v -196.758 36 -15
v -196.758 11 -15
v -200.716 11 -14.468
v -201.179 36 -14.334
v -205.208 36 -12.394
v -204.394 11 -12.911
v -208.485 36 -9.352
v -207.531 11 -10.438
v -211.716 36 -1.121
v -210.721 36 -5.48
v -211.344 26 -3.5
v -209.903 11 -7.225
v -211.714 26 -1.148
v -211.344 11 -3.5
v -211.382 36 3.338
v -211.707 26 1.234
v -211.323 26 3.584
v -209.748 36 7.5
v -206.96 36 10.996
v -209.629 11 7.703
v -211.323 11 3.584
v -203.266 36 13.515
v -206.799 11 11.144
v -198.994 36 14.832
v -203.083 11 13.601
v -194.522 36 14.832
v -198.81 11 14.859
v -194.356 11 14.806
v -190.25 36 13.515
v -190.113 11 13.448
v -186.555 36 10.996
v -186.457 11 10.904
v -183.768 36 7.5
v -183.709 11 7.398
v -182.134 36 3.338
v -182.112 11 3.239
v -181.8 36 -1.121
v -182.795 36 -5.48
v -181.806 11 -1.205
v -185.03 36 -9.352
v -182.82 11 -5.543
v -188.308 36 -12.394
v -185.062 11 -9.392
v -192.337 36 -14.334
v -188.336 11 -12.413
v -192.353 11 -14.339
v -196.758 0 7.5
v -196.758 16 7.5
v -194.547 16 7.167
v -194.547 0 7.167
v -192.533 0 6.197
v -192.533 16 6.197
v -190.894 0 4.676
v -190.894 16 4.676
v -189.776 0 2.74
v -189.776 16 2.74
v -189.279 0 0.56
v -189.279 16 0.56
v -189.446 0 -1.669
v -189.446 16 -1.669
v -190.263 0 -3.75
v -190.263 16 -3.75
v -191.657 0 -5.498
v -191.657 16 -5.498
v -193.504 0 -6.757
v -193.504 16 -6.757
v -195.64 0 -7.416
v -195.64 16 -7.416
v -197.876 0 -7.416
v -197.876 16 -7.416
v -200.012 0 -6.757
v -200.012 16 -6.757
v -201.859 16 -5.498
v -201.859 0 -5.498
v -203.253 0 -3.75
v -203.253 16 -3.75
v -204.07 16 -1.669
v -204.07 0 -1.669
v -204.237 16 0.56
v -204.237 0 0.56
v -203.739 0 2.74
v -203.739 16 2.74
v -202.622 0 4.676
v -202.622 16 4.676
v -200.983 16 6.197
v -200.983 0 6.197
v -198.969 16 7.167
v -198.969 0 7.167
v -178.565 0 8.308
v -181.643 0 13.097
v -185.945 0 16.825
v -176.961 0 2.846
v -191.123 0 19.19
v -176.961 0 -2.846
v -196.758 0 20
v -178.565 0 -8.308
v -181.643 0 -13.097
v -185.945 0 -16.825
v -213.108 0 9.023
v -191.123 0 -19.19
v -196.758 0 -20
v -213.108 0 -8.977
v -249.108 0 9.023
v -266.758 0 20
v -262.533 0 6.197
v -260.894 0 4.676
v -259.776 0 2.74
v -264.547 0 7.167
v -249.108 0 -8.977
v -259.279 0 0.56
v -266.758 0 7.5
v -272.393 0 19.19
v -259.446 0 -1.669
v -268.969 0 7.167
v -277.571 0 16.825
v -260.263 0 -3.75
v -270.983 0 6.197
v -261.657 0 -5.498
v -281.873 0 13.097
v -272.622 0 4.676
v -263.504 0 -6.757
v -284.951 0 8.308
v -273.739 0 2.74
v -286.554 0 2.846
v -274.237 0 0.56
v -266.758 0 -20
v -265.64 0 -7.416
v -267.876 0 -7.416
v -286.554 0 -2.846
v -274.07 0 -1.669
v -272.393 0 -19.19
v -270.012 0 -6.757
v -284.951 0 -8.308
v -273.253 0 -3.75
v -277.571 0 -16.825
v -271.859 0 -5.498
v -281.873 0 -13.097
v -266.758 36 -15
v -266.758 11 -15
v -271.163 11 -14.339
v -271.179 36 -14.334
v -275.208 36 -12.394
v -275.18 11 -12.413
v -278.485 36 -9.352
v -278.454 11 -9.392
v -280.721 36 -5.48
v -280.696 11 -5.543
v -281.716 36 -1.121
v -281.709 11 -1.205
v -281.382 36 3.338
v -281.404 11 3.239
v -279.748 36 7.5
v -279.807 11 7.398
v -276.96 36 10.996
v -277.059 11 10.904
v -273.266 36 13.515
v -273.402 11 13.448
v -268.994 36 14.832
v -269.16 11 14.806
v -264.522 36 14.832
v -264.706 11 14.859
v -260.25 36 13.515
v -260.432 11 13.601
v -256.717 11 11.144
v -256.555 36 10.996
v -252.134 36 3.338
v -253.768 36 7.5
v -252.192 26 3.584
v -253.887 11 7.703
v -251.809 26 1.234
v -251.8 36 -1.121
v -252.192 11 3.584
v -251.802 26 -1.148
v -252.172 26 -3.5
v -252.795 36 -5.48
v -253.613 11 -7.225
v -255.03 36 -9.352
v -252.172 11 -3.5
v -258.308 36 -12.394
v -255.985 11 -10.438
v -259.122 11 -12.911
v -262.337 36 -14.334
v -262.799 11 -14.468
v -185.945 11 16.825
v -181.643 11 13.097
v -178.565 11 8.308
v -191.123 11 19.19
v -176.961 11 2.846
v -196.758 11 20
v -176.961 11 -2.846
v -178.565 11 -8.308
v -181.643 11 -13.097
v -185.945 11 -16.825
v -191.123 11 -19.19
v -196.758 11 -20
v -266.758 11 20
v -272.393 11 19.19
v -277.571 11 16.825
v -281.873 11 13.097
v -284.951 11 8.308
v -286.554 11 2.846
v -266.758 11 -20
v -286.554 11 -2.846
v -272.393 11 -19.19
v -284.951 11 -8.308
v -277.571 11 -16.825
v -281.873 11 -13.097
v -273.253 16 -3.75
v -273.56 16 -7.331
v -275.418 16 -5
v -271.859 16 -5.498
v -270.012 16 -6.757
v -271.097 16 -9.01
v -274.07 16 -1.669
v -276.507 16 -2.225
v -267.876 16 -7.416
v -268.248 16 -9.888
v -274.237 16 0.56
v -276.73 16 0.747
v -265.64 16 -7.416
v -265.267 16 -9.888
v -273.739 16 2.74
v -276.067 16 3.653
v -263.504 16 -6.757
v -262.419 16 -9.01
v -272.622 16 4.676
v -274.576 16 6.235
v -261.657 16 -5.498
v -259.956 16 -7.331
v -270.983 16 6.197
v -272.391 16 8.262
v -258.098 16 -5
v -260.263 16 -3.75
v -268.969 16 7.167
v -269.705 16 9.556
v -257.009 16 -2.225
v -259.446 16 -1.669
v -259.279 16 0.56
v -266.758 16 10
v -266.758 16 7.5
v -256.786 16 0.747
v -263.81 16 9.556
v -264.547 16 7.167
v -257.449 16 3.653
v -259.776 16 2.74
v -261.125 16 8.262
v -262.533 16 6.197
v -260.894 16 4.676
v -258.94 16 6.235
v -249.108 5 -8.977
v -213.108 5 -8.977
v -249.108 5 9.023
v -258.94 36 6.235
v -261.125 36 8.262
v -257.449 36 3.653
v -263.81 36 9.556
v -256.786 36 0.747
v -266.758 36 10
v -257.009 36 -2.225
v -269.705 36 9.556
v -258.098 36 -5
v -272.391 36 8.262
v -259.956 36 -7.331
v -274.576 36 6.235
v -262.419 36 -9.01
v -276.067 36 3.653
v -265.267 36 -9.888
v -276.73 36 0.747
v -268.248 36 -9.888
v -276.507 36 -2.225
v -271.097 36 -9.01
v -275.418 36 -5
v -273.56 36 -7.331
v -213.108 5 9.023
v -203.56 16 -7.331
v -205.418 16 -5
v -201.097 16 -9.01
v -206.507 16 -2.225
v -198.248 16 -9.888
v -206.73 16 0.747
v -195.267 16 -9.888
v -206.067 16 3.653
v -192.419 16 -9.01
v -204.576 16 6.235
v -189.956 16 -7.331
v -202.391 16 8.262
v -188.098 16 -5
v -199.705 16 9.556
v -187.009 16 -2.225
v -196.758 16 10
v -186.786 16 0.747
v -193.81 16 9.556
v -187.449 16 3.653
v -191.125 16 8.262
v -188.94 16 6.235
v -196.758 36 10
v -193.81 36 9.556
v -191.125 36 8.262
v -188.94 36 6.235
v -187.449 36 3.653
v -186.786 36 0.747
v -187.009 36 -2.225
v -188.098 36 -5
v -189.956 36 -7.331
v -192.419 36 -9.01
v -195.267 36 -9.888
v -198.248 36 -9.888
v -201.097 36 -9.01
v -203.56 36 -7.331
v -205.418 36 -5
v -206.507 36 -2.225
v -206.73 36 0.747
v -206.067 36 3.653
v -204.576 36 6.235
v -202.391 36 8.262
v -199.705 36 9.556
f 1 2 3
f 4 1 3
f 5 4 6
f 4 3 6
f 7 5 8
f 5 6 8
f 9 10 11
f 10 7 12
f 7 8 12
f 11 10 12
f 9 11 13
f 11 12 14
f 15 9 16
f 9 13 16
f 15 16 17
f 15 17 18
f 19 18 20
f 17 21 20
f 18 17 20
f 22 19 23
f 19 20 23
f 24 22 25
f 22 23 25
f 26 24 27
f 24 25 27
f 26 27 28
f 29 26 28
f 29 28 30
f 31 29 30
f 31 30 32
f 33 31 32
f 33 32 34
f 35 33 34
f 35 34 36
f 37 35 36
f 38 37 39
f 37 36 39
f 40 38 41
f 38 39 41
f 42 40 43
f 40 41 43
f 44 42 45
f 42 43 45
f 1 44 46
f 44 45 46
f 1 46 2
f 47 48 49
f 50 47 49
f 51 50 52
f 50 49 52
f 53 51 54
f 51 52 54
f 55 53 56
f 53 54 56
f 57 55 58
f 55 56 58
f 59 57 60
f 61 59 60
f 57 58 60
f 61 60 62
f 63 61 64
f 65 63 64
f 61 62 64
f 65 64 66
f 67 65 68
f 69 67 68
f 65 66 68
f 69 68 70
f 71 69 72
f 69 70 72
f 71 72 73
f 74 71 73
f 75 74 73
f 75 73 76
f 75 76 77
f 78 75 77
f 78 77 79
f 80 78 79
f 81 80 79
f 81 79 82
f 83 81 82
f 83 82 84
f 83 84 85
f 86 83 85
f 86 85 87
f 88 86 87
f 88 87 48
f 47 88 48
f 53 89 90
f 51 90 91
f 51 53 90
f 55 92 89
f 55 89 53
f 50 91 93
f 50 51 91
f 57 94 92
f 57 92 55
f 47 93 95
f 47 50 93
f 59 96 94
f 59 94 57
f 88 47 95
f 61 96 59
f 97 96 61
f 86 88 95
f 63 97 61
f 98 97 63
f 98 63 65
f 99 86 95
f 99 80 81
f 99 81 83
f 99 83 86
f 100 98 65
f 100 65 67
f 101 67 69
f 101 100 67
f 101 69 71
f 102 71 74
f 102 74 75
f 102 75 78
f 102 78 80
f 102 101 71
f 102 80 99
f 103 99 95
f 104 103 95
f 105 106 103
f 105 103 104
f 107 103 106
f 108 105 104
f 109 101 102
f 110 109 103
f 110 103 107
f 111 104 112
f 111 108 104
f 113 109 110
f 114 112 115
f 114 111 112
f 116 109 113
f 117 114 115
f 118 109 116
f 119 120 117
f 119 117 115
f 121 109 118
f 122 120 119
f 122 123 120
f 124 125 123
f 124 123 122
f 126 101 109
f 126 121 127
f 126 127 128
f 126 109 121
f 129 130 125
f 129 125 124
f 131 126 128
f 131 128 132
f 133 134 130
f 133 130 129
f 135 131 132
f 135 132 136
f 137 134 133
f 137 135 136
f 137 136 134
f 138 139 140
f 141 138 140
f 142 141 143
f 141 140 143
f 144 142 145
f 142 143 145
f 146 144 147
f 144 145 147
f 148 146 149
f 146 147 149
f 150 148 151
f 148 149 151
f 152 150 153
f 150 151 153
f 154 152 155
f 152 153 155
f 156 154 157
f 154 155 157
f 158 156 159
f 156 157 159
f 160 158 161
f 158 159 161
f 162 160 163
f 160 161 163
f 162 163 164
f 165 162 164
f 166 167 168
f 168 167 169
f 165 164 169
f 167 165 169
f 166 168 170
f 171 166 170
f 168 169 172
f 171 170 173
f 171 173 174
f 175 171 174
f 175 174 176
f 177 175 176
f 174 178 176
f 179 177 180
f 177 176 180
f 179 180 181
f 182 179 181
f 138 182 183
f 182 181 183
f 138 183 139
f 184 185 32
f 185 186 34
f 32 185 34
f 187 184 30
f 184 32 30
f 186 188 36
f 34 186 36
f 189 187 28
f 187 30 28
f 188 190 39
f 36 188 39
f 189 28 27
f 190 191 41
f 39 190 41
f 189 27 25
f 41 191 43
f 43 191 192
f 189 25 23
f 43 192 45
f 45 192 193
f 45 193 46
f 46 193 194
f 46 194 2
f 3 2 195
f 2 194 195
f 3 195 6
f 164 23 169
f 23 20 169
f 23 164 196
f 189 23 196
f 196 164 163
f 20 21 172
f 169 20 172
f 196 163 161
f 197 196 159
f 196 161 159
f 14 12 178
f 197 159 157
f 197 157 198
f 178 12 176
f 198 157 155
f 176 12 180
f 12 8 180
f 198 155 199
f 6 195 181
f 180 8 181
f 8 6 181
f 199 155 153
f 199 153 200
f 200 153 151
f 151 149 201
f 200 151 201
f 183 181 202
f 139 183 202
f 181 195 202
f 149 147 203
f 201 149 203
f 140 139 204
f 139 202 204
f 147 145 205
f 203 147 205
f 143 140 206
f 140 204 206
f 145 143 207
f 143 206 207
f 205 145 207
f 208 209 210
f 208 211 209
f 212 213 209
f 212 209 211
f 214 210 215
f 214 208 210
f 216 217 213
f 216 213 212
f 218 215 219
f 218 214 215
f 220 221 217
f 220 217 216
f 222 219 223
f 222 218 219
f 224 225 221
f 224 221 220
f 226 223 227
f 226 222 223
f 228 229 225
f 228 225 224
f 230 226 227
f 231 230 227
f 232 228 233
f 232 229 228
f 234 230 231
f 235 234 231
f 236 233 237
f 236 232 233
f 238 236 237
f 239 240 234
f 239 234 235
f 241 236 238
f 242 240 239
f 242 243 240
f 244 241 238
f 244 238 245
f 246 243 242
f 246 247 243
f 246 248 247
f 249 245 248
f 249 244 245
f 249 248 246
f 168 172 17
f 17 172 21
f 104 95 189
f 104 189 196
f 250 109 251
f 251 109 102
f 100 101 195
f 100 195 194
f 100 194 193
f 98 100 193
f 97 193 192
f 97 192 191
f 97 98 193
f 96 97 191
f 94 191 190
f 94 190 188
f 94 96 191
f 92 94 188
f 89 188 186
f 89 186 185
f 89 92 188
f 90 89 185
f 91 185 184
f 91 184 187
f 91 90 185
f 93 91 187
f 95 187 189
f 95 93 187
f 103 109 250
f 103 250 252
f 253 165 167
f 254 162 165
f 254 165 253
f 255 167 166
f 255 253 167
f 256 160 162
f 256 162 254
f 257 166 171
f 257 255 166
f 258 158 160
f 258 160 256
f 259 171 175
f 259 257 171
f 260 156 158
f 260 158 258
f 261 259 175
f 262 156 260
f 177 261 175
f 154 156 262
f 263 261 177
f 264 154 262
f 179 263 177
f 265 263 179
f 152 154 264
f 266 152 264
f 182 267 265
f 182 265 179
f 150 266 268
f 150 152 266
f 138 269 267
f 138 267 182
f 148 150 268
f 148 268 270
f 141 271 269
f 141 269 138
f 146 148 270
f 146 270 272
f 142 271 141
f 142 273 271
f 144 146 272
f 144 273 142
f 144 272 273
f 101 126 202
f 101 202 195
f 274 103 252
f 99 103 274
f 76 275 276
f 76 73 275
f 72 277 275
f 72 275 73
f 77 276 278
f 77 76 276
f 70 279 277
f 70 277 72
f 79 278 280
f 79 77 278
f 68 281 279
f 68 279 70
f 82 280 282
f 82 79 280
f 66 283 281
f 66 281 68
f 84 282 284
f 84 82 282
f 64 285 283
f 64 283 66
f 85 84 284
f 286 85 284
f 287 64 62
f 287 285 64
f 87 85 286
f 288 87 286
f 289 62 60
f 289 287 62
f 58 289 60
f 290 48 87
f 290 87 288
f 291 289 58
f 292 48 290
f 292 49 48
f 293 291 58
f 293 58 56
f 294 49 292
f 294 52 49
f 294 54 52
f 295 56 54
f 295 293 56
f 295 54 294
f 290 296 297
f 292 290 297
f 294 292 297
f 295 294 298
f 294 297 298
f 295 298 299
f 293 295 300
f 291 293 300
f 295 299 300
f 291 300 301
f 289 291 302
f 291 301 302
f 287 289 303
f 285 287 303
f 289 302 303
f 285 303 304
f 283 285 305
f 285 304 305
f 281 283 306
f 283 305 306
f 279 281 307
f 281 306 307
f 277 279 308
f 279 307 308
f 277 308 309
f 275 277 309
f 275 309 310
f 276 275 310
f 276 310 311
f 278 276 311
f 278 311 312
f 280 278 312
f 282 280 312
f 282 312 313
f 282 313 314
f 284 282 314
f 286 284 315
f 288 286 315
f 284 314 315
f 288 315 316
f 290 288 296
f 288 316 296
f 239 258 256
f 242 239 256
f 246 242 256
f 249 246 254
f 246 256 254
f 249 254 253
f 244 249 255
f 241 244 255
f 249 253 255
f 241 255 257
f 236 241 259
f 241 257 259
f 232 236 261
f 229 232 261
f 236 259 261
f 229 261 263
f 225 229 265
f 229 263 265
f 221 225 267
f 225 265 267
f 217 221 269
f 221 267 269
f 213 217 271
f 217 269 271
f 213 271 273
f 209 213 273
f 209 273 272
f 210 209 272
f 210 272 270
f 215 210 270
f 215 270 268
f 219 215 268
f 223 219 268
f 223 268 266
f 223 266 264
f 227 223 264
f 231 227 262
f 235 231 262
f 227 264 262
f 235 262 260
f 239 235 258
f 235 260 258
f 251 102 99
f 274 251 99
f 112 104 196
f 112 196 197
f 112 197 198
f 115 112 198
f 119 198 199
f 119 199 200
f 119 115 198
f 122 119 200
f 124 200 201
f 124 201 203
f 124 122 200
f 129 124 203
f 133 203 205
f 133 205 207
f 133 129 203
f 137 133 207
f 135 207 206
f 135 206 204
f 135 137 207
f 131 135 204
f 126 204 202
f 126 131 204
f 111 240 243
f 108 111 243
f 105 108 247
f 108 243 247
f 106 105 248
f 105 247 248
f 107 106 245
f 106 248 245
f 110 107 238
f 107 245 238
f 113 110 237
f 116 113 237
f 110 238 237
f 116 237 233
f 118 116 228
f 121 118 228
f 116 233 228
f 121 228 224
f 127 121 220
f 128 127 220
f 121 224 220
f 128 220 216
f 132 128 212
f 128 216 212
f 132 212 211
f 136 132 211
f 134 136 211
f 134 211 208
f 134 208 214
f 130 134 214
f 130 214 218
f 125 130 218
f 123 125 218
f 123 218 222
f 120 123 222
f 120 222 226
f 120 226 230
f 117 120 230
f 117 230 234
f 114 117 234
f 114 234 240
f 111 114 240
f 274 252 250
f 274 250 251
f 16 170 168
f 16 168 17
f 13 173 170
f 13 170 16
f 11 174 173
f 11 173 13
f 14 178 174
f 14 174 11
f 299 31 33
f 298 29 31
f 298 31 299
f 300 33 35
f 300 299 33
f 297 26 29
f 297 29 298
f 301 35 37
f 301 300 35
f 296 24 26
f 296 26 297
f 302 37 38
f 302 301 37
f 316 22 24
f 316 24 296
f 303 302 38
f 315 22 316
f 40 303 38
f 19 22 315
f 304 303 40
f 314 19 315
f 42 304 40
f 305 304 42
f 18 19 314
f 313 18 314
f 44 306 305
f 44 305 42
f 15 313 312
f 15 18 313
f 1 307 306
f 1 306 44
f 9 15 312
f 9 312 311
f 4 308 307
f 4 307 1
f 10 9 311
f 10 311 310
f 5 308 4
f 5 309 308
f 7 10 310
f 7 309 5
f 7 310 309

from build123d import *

# Parameters (mm, degrees)
BOSS_EXTRUDE2_DEPTH = 11
SKETCH5_R           = 15
BOSS_EXTRUDE4_DEPTH = 25
SKETCH6_R           = 10
CUT_EXTRUDE1_DEPTH  = 20
SKETCH7_R           = 7.5
CUT_EXTRUDE2_DEPTH  = 289.149419546
SKETCH8_W           = 40.868784051
SKETCH8_H           = 7.083722135
BOSS_EXTRUDE5_DEPTH = 15
SKETCH9_W           = 36
SKETCH9_H           = 18
CUT_EXTRUDE3_DEPTH  = 5


with BuildPart() as part:
    # Sketch3 → Boss-Extrude2 (new body)
    with BuildSketch(Plane(origin=(0, 0, 0), x_dir=(1, 0, 0), z_dir=(0, 1, 0))):
        with BuildLine():
            Line((-266.757890885, 20), (-196.757890885, 20))
            ThreePointArc((-196.757890885, 20), (-176.757890885, 0), (-196.757890885, -20))
            Line((-196.757890885, -20), (-266.757890885, -20))
            ThreePointArc((-266.757890885, -20), (-286.757890885, 0), (-266.757890885, 20))
        make_face()
    extrude(amount=BOSS_EXTRUDE2_DEPTH)

    # Sketch5 → Boss-Extrude4 (add)
    with BuildSketch(Plane(origin=(0, 11, 0), x_dir=(1, 0, 0), z_dir=(0, 1, 0))):
        with Locations(Location((-196.757890885, 0, 0), (0, 0, 90))):
            Circle(SKETCH5_R)
        with Locations(Location((-266.757890885, 0, 0), (0, 0, 90))):
            Circle(SKETCH5_R)
    extrude(amount=BOSS_EXTRUDE4_DEPTH)

    # Sketch6 → Cut-Extrude1 (cut)
    with BuildSketch(Plane(origin=(0, 36, 0), x_dir=(1, 0, 0), z_dir=(0, 1, 0))):
        with Locations(Location((-266.757890885, 0, 0), (0, 0, 270))):
            Circle(SKETCH6_R)
        with Locations(Location((-196.757890885, 0, 0), (0, 0, 270))):
            Circle(SKETCH6_R)
    extrude(amount=-CUT_EXTRUDE1_DEPTH, mode=Mode.SUBTRACT)

    # Sketch7 → Cut-Extrude2 (cut, through all)
    with BuildSketch(Plane(origin=(0, 16, 0), x_dir=(1, 0, 0), z_dir=(0, 1, 0))):
        with Locations(Location((-196.757890885, 0, 0), (0, 0, 270))):
            Circle(SKETCH7_R)
        with Locations(Location((-266.757890885, 0, 0), (0, 0, 270))):
            Circle(SKETCH7_R)
    extrude(amount=-CUT_EXTRUDE2_DEPTH, mode=Mode.SUBTRACT)

    # Sketch8 → Boss-Extrude5 (add)
    with BuildSketch(Plane(origin=(0, 11, 0), x_dir=(1, 0, 0), z_dir=(0, 1, 0))):
        with Locations((-231.757890885, -0.041861068)):
            Rectangle(SKETCH8_W, SKETCH8_H)
    extrude(amount=BOSS_EXTRUDE5_DEPTH)

    # Sketch9 → Cut-Extrude3 (cut)
    with BuildSketch(Plane.XZ):
        with Locations((-231.107838077, 0.023445498)):
            Rectangle(SKETCH9_W, SKETCH9_H)
    extrude(amount=-CUT_EXTRUDE3_DEPTH, mode=Mode.SUBTRACT)


solid = part.part
